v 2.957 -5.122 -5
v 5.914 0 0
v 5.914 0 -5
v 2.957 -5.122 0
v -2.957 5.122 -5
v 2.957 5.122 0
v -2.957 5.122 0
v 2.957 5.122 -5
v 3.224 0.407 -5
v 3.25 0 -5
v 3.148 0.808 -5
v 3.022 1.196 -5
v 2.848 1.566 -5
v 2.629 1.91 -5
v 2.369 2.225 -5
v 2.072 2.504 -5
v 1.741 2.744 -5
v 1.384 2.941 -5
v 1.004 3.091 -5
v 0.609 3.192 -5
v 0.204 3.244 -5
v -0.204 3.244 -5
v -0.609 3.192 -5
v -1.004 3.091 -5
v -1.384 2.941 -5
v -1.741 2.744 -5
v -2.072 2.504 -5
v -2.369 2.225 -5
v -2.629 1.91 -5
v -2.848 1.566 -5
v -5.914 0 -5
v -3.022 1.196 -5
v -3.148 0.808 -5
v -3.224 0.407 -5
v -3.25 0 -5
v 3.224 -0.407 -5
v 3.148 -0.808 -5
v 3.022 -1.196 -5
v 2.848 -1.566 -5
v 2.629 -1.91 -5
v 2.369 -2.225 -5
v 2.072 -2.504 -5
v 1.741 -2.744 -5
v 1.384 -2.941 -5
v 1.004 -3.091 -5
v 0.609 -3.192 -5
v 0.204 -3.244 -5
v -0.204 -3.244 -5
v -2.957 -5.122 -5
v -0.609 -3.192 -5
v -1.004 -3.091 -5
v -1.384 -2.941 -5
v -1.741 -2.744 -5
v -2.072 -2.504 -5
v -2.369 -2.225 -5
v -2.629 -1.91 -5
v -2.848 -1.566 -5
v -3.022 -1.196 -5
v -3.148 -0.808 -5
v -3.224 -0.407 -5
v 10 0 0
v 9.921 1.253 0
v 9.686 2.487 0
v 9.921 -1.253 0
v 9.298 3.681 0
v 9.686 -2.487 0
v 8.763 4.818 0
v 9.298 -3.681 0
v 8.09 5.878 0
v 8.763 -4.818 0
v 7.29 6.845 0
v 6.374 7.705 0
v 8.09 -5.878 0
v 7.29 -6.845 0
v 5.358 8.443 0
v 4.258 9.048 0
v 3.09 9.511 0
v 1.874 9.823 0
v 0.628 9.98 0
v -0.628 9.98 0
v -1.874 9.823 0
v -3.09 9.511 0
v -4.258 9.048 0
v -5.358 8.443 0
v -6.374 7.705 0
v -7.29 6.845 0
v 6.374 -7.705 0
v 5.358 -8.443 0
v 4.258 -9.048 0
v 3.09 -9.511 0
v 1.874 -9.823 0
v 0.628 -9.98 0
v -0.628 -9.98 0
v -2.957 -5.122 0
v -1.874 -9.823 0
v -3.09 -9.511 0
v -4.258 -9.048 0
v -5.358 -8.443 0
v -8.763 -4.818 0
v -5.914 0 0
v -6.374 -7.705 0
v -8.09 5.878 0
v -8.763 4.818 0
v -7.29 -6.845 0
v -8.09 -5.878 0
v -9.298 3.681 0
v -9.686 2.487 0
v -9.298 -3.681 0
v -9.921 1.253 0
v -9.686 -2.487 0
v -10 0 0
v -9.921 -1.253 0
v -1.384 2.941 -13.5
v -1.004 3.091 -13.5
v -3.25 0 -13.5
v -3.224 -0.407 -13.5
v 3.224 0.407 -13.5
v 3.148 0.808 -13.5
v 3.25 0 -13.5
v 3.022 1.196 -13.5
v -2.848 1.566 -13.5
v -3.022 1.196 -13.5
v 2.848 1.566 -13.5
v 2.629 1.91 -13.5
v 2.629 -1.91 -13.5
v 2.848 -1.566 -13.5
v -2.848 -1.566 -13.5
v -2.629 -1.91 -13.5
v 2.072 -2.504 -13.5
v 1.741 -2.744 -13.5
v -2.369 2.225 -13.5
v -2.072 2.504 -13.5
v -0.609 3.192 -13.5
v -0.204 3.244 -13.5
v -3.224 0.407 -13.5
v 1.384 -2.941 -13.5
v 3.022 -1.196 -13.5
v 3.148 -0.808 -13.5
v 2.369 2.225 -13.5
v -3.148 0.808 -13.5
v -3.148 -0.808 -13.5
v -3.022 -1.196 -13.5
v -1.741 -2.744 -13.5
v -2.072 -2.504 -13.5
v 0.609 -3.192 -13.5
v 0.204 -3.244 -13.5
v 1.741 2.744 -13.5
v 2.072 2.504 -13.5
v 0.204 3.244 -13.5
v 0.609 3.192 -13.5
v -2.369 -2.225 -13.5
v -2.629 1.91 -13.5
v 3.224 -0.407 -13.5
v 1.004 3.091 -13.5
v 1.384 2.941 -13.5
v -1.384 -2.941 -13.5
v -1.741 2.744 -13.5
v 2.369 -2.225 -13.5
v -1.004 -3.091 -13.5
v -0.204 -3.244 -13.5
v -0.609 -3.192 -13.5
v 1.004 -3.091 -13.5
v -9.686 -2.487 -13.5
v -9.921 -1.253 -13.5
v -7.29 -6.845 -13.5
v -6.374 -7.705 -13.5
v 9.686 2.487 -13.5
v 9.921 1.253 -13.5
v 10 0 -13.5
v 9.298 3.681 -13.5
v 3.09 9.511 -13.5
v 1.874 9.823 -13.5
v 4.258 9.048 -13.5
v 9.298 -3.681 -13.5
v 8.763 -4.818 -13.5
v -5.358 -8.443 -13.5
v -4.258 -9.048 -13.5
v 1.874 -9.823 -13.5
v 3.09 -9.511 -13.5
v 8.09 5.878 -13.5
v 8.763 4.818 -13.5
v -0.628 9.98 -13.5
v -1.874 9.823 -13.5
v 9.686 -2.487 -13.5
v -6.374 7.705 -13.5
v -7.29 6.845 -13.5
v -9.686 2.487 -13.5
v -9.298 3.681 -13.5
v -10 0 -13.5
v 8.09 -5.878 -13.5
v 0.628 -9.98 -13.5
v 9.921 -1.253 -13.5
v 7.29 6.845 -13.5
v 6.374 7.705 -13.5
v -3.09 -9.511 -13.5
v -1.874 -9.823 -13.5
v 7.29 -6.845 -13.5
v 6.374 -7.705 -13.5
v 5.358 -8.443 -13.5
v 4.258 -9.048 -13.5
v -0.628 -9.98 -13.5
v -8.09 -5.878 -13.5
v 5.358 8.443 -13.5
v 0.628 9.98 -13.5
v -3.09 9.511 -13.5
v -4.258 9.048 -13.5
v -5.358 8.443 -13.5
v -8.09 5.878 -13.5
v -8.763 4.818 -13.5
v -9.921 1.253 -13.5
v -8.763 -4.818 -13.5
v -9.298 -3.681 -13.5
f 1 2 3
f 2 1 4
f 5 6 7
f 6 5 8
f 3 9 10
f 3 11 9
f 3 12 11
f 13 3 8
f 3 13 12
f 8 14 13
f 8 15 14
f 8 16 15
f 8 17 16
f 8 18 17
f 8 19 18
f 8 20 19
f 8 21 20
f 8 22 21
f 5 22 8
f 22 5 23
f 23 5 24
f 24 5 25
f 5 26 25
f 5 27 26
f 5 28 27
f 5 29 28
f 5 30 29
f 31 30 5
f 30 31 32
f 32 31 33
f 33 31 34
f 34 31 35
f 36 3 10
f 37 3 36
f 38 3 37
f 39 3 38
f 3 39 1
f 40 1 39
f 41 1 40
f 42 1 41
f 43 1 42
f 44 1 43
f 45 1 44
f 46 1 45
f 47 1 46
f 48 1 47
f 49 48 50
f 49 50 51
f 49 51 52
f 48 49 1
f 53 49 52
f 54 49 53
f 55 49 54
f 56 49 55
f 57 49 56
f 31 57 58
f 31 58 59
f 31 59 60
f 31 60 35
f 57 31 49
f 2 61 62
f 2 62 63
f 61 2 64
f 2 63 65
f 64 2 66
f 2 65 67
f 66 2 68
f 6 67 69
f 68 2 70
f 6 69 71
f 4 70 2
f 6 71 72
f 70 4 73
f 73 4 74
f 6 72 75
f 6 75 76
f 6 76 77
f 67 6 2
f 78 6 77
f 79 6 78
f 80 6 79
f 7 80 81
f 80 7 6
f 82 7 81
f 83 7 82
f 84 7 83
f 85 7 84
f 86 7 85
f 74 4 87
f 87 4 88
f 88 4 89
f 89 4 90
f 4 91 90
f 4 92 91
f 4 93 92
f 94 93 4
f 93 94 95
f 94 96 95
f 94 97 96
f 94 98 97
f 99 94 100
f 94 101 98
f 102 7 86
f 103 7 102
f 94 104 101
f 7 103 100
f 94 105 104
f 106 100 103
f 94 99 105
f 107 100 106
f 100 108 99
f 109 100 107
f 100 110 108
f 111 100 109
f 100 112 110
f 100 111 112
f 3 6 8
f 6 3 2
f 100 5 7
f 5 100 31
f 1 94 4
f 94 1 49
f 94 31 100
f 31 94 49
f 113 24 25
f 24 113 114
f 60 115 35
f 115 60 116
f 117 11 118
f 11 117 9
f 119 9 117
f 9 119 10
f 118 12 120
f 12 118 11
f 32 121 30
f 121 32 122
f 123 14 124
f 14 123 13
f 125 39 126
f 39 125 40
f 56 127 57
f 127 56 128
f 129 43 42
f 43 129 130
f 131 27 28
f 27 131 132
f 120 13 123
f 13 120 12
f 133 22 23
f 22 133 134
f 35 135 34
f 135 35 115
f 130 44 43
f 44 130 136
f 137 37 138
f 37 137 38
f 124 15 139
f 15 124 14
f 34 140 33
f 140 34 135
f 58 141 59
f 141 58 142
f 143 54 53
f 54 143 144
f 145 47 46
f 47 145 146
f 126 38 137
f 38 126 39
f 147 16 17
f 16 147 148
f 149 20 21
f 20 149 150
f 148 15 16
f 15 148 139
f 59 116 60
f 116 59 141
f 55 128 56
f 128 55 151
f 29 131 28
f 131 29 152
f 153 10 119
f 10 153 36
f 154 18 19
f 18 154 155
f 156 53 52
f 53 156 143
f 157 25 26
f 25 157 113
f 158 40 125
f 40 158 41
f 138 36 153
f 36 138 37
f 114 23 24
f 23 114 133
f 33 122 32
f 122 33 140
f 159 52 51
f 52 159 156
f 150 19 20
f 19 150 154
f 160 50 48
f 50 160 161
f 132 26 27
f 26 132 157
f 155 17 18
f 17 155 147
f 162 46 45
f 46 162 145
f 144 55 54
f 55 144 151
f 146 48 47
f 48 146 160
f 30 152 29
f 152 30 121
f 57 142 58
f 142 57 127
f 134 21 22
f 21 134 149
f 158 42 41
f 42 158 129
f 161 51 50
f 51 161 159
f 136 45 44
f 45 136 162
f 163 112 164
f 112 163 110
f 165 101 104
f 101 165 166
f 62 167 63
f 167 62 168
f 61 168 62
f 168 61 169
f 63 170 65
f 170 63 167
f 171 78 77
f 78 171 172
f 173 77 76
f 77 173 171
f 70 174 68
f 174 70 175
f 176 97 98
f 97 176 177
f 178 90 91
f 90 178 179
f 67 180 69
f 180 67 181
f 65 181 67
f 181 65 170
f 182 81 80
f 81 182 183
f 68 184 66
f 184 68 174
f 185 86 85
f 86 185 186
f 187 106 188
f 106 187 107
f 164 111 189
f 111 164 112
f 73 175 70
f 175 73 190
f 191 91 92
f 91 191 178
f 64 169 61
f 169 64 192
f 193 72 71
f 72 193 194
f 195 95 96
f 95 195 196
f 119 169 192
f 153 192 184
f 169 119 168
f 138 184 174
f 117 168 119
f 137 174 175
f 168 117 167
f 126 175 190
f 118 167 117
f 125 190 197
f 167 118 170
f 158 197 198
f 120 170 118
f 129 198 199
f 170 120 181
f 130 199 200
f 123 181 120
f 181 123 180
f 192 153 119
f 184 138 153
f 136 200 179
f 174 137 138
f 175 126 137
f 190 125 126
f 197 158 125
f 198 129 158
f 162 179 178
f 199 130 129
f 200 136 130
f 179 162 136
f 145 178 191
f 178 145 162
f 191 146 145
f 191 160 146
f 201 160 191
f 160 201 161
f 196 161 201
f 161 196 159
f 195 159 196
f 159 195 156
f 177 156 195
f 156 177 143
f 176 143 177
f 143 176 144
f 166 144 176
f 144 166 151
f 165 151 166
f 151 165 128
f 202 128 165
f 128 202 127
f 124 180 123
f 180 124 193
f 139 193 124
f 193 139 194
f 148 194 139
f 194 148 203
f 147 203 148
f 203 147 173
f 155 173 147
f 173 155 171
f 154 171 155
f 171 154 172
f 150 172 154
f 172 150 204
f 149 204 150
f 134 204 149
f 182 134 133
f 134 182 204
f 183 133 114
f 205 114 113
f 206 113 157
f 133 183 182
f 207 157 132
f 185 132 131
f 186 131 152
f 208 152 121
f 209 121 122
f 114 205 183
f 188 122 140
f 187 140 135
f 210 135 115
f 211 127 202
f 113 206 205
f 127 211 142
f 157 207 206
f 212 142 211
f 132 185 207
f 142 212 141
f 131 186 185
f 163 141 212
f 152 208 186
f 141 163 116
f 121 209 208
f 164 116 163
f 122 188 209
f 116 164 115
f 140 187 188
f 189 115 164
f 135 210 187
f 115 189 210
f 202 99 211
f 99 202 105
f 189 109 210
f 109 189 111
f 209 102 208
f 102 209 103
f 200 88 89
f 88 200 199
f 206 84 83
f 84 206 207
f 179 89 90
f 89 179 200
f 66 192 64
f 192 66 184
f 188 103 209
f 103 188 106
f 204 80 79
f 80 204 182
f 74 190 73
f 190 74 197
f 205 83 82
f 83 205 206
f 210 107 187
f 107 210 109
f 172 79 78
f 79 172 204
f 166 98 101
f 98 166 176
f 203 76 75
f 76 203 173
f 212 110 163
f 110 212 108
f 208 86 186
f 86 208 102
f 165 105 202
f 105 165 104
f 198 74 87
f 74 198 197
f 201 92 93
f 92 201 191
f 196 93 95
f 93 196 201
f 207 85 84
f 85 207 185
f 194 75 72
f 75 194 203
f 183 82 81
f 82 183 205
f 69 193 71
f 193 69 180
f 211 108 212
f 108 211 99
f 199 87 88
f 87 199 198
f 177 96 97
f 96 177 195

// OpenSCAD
$fn = 50;


difference() {
	union() {
		translate(v = [0, 0, -13.5000000000]) {
			cylinder(h = 13.5000000000, r = 10.0000000000);
		}
	}
	union() {
		translate(v = [0, 0, 0]) {
			rotate(a = [0, 0, 0]) {
				difference() {
					union() {
						translate(v = [0, 0, -5]) {
							linear_extrude(height = 5) {
								polygon(points = [[5.9142500000, 0.0000000000], [2.9571250000, 5.1218907443], [-2.9571250000, 5.1218907443], [-5.9142500000, 0.0000000000], [-2.9571250000, -5.1218907443], [2.9571250000, -5.1218907443]]);
							}
						}
					}
					union();
				}
			}
		}
		#translate(v = [0, 0, -100.0000000000]) {
			cylinder(h = 200, r = 3.2500000000);
		}
	}
}
